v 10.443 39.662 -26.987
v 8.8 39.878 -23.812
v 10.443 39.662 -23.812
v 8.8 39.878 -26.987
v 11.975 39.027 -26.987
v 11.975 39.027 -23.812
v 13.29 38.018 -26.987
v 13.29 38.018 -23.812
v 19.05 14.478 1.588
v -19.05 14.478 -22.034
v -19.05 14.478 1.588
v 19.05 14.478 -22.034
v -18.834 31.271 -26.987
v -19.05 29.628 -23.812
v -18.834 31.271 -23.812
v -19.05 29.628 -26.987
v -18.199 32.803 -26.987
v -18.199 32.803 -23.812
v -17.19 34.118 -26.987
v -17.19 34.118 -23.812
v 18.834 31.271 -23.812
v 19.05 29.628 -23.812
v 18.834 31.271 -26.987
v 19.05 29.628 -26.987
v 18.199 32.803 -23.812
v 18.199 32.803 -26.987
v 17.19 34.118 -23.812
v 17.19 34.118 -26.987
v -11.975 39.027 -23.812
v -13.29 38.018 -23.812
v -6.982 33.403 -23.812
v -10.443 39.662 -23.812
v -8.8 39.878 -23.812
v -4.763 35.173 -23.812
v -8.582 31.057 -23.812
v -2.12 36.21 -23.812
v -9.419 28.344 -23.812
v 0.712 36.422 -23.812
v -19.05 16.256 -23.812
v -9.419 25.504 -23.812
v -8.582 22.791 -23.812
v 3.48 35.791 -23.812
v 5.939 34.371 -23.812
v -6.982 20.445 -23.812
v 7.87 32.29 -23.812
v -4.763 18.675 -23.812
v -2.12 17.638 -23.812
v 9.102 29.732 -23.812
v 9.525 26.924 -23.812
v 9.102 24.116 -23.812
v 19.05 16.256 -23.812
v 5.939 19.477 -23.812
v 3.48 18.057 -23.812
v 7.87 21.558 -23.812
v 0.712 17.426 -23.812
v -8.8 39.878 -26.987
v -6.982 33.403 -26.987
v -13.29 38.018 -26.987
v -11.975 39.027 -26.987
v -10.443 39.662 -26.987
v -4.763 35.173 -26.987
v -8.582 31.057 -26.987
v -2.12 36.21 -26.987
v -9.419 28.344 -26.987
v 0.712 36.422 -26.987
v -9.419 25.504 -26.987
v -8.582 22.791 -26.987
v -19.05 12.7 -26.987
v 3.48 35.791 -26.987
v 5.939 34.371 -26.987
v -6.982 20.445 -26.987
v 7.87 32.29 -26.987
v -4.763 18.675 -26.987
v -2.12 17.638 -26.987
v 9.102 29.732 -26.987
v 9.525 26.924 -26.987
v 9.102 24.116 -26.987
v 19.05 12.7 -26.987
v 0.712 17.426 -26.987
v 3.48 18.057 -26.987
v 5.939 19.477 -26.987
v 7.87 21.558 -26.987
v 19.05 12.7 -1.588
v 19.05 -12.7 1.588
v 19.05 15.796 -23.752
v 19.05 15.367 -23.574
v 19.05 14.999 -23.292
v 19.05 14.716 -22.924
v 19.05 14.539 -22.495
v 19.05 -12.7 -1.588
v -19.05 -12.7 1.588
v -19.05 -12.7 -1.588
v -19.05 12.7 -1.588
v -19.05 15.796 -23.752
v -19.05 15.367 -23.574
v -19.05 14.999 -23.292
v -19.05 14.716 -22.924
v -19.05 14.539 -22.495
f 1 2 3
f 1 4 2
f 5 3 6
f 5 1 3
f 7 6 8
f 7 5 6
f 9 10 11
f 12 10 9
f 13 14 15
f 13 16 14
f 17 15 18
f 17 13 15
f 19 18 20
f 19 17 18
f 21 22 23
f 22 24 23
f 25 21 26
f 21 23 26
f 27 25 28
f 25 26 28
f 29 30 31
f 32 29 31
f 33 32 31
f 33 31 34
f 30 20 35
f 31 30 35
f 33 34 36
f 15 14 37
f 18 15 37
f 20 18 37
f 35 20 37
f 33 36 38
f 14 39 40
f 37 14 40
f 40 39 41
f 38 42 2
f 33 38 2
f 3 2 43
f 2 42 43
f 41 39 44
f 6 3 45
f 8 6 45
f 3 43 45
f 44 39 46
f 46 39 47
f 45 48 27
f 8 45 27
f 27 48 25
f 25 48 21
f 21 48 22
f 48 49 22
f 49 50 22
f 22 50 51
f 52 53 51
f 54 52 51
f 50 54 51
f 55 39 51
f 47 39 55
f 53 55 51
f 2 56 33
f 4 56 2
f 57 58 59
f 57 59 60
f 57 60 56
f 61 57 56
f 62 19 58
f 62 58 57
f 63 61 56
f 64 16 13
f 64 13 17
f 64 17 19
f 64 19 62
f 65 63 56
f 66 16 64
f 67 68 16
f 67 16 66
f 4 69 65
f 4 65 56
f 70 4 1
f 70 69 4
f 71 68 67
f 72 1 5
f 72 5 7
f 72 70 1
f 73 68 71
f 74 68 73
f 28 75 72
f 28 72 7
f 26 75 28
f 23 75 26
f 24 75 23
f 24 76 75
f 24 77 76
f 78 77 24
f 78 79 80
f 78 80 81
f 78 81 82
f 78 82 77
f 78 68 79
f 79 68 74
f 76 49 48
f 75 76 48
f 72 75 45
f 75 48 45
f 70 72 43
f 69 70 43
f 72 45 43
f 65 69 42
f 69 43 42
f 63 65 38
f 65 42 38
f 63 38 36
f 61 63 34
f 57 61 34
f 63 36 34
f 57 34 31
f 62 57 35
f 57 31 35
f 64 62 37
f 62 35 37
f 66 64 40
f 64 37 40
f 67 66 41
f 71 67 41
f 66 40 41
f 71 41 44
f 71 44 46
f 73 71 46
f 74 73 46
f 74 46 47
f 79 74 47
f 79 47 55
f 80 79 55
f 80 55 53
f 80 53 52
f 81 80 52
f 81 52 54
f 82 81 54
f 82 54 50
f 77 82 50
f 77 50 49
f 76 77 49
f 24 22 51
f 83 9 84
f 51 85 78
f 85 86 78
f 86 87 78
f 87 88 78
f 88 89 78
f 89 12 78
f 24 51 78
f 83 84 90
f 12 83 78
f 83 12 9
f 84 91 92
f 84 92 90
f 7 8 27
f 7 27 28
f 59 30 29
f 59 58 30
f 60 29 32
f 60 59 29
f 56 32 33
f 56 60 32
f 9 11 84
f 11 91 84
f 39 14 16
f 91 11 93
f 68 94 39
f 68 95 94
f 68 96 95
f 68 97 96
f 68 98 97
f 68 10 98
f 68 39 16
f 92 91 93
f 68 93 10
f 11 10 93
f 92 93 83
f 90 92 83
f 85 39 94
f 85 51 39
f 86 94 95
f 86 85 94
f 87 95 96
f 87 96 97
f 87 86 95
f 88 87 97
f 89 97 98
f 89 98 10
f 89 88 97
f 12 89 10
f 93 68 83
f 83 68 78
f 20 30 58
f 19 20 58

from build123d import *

# Parameters (mm, degrees)
SKETCH1_W           = 38.1
SKETCH1_H           = 25.4
BOSS_EXTRUDE1_DEPTH = 1.5875
SKETCH2_W           = 38.1
SKETCH2_H           = 28.575
BOSS_EXTRUDE2_DEPTH = 1.778
SKETCH3_W           = 38.1
SKETCH3_H           = 3.175
BOSS_EXTRUDE3_DEPTH = 25.4
SKETCH5_R           = 9.525
CUT_EXTRUDE1_DEPTH  = 51.973693058
CHAMFER1_SIZE       = 7.62
FILLET1_R           = 6.35
FILLET2_R           = 1.778


with BuildPart() as part:
    # Sketch1 → Boss-Extrude1 (new, symmetric)
    with BuildSketch(Plane.XY):
        Rectangle(SKETCH1_W, SKETCH1_H)
    extrude(amount=BOSS_EXTRUDE1_DEPTH, both=True)

    # Sketch2 → Boss-Extrude2 (add)
    with BuildSketch(Plane(origin=(0, 12.7, 0), x_dir=(1, 0, 0), z_dir=(0, 1, 0))):
        with Locations((0, 12.7)):
            Rectangle(SKETCH2_W, SKETCH2_H)
    extrude(amount=BOSS_EXTRUDE2_DEPTH)

    # Sketch3 → Boss-Extrude3 (add)
    with BuildSketch(Plane(origin=(0, 14.478, 0), x_dir=(1, 0, 0), z_dir=(0, 1, 0))):
        with Locations((0, 25.4)):
            Rectangle(SKETCH3_W, SKETCH3_H)
    extrude(amount=BOSS_EXTRUDE3_DEPTH)

    # Sketch5 → Cut-Extrude1 (cut, through all)
    with BuildSketch(Plane.XY.offset(-23.8125)):
        with Locations((0, 26.924)):
            Circle(SKETCH5_R)
    extrude(amount=-CUT_EXTRUDE1_DEPTH, mode=Mode.SUBTRACT)

    # Chamfer1
    chamfer1_edges = [part.edges().sort_by_distance(p)[0] for p in [
        (-19.05, 39.878, -25.4),
        (19.05, 39.878, -25.4),
    ]]
    chamfer(chamfer1_edges, length=CHAMFER1_SIZE)

    # Fillet1
    fillet1_edges = [part.edges().sort_by_distance(p)[0] for p in [
        (-19.05, 32.258, -25.4),
        (-11.43, 39.878, -25.4),
        (19.05, 32.258, -25.4),
        (11.43, 39.878, -25.4),
    ]]
    fillet(fillet1_edges, radius=FILLET1_R)

    # Fillet2
    fillet2_edges = [part.edges().sort_by_distance(p)[0] for p in [
        (0, 14.478, -23.8125),
    ]]
    fillet(fillet2_edges, radius=FILLET2_R)


solid = part.part
